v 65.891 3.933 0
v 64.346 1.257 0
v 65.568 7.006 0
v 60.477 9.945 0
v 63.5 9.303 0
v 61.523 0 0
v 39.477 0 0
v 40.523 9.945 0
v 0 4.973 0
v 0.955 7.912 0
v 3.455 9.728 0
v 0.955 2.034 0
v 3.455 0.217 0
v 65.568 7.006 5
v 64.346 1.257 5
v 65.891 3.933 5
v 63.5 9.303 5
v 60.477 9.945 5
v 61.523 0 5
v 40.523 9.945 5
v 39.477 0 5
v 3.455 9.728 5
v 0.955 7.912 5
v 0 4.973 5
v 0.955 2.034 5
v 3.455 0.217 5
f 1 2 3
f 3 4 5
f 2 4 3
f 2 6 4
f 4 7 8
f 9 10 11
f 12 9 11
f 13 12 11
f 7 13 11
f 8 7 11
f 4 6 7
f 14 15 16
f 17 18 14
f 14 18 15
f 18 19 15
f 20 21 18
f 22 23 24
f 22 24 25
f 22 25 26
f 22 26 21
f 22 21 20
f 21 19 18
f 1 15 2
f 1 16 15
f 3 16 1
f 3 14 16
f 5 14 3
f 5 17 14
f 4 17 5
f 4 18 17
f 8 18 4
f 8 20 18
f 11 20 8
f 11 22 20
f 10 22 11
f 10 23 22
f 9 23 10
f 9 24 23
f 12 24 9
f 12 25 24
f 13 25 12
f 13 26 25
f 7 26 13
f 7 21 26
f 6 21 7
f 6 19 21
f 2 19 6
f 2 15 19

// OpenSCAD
$fn = 32;

// ----------------------------------------------------------------------
// Lever arm: two bosses 10 and 10 mm, 35 mm between centres
// ----------------------------------------------------------------------

// --- parameters (mm) ---
profile_height = 5;       // extrusion height
profile_points = 13;      // points of the closed outline

profile = [[0, 4.973], [0.955, 2.034], [3.455, 0.217], [39.477, 0], [61.523, 0], [64.346, 1.257], [65.891, 3.933], [65.568, 7.006], [63.5, 9.303], [60.477, 9.945], [40.523, 9.945], [3.455, 9.728], [0.955, 7.912]];  // single closed polygon, 13 points, counter clockwise

// --- the one profile operation ---
linear_extrude(height = profile_height) polygon(points = profile);
